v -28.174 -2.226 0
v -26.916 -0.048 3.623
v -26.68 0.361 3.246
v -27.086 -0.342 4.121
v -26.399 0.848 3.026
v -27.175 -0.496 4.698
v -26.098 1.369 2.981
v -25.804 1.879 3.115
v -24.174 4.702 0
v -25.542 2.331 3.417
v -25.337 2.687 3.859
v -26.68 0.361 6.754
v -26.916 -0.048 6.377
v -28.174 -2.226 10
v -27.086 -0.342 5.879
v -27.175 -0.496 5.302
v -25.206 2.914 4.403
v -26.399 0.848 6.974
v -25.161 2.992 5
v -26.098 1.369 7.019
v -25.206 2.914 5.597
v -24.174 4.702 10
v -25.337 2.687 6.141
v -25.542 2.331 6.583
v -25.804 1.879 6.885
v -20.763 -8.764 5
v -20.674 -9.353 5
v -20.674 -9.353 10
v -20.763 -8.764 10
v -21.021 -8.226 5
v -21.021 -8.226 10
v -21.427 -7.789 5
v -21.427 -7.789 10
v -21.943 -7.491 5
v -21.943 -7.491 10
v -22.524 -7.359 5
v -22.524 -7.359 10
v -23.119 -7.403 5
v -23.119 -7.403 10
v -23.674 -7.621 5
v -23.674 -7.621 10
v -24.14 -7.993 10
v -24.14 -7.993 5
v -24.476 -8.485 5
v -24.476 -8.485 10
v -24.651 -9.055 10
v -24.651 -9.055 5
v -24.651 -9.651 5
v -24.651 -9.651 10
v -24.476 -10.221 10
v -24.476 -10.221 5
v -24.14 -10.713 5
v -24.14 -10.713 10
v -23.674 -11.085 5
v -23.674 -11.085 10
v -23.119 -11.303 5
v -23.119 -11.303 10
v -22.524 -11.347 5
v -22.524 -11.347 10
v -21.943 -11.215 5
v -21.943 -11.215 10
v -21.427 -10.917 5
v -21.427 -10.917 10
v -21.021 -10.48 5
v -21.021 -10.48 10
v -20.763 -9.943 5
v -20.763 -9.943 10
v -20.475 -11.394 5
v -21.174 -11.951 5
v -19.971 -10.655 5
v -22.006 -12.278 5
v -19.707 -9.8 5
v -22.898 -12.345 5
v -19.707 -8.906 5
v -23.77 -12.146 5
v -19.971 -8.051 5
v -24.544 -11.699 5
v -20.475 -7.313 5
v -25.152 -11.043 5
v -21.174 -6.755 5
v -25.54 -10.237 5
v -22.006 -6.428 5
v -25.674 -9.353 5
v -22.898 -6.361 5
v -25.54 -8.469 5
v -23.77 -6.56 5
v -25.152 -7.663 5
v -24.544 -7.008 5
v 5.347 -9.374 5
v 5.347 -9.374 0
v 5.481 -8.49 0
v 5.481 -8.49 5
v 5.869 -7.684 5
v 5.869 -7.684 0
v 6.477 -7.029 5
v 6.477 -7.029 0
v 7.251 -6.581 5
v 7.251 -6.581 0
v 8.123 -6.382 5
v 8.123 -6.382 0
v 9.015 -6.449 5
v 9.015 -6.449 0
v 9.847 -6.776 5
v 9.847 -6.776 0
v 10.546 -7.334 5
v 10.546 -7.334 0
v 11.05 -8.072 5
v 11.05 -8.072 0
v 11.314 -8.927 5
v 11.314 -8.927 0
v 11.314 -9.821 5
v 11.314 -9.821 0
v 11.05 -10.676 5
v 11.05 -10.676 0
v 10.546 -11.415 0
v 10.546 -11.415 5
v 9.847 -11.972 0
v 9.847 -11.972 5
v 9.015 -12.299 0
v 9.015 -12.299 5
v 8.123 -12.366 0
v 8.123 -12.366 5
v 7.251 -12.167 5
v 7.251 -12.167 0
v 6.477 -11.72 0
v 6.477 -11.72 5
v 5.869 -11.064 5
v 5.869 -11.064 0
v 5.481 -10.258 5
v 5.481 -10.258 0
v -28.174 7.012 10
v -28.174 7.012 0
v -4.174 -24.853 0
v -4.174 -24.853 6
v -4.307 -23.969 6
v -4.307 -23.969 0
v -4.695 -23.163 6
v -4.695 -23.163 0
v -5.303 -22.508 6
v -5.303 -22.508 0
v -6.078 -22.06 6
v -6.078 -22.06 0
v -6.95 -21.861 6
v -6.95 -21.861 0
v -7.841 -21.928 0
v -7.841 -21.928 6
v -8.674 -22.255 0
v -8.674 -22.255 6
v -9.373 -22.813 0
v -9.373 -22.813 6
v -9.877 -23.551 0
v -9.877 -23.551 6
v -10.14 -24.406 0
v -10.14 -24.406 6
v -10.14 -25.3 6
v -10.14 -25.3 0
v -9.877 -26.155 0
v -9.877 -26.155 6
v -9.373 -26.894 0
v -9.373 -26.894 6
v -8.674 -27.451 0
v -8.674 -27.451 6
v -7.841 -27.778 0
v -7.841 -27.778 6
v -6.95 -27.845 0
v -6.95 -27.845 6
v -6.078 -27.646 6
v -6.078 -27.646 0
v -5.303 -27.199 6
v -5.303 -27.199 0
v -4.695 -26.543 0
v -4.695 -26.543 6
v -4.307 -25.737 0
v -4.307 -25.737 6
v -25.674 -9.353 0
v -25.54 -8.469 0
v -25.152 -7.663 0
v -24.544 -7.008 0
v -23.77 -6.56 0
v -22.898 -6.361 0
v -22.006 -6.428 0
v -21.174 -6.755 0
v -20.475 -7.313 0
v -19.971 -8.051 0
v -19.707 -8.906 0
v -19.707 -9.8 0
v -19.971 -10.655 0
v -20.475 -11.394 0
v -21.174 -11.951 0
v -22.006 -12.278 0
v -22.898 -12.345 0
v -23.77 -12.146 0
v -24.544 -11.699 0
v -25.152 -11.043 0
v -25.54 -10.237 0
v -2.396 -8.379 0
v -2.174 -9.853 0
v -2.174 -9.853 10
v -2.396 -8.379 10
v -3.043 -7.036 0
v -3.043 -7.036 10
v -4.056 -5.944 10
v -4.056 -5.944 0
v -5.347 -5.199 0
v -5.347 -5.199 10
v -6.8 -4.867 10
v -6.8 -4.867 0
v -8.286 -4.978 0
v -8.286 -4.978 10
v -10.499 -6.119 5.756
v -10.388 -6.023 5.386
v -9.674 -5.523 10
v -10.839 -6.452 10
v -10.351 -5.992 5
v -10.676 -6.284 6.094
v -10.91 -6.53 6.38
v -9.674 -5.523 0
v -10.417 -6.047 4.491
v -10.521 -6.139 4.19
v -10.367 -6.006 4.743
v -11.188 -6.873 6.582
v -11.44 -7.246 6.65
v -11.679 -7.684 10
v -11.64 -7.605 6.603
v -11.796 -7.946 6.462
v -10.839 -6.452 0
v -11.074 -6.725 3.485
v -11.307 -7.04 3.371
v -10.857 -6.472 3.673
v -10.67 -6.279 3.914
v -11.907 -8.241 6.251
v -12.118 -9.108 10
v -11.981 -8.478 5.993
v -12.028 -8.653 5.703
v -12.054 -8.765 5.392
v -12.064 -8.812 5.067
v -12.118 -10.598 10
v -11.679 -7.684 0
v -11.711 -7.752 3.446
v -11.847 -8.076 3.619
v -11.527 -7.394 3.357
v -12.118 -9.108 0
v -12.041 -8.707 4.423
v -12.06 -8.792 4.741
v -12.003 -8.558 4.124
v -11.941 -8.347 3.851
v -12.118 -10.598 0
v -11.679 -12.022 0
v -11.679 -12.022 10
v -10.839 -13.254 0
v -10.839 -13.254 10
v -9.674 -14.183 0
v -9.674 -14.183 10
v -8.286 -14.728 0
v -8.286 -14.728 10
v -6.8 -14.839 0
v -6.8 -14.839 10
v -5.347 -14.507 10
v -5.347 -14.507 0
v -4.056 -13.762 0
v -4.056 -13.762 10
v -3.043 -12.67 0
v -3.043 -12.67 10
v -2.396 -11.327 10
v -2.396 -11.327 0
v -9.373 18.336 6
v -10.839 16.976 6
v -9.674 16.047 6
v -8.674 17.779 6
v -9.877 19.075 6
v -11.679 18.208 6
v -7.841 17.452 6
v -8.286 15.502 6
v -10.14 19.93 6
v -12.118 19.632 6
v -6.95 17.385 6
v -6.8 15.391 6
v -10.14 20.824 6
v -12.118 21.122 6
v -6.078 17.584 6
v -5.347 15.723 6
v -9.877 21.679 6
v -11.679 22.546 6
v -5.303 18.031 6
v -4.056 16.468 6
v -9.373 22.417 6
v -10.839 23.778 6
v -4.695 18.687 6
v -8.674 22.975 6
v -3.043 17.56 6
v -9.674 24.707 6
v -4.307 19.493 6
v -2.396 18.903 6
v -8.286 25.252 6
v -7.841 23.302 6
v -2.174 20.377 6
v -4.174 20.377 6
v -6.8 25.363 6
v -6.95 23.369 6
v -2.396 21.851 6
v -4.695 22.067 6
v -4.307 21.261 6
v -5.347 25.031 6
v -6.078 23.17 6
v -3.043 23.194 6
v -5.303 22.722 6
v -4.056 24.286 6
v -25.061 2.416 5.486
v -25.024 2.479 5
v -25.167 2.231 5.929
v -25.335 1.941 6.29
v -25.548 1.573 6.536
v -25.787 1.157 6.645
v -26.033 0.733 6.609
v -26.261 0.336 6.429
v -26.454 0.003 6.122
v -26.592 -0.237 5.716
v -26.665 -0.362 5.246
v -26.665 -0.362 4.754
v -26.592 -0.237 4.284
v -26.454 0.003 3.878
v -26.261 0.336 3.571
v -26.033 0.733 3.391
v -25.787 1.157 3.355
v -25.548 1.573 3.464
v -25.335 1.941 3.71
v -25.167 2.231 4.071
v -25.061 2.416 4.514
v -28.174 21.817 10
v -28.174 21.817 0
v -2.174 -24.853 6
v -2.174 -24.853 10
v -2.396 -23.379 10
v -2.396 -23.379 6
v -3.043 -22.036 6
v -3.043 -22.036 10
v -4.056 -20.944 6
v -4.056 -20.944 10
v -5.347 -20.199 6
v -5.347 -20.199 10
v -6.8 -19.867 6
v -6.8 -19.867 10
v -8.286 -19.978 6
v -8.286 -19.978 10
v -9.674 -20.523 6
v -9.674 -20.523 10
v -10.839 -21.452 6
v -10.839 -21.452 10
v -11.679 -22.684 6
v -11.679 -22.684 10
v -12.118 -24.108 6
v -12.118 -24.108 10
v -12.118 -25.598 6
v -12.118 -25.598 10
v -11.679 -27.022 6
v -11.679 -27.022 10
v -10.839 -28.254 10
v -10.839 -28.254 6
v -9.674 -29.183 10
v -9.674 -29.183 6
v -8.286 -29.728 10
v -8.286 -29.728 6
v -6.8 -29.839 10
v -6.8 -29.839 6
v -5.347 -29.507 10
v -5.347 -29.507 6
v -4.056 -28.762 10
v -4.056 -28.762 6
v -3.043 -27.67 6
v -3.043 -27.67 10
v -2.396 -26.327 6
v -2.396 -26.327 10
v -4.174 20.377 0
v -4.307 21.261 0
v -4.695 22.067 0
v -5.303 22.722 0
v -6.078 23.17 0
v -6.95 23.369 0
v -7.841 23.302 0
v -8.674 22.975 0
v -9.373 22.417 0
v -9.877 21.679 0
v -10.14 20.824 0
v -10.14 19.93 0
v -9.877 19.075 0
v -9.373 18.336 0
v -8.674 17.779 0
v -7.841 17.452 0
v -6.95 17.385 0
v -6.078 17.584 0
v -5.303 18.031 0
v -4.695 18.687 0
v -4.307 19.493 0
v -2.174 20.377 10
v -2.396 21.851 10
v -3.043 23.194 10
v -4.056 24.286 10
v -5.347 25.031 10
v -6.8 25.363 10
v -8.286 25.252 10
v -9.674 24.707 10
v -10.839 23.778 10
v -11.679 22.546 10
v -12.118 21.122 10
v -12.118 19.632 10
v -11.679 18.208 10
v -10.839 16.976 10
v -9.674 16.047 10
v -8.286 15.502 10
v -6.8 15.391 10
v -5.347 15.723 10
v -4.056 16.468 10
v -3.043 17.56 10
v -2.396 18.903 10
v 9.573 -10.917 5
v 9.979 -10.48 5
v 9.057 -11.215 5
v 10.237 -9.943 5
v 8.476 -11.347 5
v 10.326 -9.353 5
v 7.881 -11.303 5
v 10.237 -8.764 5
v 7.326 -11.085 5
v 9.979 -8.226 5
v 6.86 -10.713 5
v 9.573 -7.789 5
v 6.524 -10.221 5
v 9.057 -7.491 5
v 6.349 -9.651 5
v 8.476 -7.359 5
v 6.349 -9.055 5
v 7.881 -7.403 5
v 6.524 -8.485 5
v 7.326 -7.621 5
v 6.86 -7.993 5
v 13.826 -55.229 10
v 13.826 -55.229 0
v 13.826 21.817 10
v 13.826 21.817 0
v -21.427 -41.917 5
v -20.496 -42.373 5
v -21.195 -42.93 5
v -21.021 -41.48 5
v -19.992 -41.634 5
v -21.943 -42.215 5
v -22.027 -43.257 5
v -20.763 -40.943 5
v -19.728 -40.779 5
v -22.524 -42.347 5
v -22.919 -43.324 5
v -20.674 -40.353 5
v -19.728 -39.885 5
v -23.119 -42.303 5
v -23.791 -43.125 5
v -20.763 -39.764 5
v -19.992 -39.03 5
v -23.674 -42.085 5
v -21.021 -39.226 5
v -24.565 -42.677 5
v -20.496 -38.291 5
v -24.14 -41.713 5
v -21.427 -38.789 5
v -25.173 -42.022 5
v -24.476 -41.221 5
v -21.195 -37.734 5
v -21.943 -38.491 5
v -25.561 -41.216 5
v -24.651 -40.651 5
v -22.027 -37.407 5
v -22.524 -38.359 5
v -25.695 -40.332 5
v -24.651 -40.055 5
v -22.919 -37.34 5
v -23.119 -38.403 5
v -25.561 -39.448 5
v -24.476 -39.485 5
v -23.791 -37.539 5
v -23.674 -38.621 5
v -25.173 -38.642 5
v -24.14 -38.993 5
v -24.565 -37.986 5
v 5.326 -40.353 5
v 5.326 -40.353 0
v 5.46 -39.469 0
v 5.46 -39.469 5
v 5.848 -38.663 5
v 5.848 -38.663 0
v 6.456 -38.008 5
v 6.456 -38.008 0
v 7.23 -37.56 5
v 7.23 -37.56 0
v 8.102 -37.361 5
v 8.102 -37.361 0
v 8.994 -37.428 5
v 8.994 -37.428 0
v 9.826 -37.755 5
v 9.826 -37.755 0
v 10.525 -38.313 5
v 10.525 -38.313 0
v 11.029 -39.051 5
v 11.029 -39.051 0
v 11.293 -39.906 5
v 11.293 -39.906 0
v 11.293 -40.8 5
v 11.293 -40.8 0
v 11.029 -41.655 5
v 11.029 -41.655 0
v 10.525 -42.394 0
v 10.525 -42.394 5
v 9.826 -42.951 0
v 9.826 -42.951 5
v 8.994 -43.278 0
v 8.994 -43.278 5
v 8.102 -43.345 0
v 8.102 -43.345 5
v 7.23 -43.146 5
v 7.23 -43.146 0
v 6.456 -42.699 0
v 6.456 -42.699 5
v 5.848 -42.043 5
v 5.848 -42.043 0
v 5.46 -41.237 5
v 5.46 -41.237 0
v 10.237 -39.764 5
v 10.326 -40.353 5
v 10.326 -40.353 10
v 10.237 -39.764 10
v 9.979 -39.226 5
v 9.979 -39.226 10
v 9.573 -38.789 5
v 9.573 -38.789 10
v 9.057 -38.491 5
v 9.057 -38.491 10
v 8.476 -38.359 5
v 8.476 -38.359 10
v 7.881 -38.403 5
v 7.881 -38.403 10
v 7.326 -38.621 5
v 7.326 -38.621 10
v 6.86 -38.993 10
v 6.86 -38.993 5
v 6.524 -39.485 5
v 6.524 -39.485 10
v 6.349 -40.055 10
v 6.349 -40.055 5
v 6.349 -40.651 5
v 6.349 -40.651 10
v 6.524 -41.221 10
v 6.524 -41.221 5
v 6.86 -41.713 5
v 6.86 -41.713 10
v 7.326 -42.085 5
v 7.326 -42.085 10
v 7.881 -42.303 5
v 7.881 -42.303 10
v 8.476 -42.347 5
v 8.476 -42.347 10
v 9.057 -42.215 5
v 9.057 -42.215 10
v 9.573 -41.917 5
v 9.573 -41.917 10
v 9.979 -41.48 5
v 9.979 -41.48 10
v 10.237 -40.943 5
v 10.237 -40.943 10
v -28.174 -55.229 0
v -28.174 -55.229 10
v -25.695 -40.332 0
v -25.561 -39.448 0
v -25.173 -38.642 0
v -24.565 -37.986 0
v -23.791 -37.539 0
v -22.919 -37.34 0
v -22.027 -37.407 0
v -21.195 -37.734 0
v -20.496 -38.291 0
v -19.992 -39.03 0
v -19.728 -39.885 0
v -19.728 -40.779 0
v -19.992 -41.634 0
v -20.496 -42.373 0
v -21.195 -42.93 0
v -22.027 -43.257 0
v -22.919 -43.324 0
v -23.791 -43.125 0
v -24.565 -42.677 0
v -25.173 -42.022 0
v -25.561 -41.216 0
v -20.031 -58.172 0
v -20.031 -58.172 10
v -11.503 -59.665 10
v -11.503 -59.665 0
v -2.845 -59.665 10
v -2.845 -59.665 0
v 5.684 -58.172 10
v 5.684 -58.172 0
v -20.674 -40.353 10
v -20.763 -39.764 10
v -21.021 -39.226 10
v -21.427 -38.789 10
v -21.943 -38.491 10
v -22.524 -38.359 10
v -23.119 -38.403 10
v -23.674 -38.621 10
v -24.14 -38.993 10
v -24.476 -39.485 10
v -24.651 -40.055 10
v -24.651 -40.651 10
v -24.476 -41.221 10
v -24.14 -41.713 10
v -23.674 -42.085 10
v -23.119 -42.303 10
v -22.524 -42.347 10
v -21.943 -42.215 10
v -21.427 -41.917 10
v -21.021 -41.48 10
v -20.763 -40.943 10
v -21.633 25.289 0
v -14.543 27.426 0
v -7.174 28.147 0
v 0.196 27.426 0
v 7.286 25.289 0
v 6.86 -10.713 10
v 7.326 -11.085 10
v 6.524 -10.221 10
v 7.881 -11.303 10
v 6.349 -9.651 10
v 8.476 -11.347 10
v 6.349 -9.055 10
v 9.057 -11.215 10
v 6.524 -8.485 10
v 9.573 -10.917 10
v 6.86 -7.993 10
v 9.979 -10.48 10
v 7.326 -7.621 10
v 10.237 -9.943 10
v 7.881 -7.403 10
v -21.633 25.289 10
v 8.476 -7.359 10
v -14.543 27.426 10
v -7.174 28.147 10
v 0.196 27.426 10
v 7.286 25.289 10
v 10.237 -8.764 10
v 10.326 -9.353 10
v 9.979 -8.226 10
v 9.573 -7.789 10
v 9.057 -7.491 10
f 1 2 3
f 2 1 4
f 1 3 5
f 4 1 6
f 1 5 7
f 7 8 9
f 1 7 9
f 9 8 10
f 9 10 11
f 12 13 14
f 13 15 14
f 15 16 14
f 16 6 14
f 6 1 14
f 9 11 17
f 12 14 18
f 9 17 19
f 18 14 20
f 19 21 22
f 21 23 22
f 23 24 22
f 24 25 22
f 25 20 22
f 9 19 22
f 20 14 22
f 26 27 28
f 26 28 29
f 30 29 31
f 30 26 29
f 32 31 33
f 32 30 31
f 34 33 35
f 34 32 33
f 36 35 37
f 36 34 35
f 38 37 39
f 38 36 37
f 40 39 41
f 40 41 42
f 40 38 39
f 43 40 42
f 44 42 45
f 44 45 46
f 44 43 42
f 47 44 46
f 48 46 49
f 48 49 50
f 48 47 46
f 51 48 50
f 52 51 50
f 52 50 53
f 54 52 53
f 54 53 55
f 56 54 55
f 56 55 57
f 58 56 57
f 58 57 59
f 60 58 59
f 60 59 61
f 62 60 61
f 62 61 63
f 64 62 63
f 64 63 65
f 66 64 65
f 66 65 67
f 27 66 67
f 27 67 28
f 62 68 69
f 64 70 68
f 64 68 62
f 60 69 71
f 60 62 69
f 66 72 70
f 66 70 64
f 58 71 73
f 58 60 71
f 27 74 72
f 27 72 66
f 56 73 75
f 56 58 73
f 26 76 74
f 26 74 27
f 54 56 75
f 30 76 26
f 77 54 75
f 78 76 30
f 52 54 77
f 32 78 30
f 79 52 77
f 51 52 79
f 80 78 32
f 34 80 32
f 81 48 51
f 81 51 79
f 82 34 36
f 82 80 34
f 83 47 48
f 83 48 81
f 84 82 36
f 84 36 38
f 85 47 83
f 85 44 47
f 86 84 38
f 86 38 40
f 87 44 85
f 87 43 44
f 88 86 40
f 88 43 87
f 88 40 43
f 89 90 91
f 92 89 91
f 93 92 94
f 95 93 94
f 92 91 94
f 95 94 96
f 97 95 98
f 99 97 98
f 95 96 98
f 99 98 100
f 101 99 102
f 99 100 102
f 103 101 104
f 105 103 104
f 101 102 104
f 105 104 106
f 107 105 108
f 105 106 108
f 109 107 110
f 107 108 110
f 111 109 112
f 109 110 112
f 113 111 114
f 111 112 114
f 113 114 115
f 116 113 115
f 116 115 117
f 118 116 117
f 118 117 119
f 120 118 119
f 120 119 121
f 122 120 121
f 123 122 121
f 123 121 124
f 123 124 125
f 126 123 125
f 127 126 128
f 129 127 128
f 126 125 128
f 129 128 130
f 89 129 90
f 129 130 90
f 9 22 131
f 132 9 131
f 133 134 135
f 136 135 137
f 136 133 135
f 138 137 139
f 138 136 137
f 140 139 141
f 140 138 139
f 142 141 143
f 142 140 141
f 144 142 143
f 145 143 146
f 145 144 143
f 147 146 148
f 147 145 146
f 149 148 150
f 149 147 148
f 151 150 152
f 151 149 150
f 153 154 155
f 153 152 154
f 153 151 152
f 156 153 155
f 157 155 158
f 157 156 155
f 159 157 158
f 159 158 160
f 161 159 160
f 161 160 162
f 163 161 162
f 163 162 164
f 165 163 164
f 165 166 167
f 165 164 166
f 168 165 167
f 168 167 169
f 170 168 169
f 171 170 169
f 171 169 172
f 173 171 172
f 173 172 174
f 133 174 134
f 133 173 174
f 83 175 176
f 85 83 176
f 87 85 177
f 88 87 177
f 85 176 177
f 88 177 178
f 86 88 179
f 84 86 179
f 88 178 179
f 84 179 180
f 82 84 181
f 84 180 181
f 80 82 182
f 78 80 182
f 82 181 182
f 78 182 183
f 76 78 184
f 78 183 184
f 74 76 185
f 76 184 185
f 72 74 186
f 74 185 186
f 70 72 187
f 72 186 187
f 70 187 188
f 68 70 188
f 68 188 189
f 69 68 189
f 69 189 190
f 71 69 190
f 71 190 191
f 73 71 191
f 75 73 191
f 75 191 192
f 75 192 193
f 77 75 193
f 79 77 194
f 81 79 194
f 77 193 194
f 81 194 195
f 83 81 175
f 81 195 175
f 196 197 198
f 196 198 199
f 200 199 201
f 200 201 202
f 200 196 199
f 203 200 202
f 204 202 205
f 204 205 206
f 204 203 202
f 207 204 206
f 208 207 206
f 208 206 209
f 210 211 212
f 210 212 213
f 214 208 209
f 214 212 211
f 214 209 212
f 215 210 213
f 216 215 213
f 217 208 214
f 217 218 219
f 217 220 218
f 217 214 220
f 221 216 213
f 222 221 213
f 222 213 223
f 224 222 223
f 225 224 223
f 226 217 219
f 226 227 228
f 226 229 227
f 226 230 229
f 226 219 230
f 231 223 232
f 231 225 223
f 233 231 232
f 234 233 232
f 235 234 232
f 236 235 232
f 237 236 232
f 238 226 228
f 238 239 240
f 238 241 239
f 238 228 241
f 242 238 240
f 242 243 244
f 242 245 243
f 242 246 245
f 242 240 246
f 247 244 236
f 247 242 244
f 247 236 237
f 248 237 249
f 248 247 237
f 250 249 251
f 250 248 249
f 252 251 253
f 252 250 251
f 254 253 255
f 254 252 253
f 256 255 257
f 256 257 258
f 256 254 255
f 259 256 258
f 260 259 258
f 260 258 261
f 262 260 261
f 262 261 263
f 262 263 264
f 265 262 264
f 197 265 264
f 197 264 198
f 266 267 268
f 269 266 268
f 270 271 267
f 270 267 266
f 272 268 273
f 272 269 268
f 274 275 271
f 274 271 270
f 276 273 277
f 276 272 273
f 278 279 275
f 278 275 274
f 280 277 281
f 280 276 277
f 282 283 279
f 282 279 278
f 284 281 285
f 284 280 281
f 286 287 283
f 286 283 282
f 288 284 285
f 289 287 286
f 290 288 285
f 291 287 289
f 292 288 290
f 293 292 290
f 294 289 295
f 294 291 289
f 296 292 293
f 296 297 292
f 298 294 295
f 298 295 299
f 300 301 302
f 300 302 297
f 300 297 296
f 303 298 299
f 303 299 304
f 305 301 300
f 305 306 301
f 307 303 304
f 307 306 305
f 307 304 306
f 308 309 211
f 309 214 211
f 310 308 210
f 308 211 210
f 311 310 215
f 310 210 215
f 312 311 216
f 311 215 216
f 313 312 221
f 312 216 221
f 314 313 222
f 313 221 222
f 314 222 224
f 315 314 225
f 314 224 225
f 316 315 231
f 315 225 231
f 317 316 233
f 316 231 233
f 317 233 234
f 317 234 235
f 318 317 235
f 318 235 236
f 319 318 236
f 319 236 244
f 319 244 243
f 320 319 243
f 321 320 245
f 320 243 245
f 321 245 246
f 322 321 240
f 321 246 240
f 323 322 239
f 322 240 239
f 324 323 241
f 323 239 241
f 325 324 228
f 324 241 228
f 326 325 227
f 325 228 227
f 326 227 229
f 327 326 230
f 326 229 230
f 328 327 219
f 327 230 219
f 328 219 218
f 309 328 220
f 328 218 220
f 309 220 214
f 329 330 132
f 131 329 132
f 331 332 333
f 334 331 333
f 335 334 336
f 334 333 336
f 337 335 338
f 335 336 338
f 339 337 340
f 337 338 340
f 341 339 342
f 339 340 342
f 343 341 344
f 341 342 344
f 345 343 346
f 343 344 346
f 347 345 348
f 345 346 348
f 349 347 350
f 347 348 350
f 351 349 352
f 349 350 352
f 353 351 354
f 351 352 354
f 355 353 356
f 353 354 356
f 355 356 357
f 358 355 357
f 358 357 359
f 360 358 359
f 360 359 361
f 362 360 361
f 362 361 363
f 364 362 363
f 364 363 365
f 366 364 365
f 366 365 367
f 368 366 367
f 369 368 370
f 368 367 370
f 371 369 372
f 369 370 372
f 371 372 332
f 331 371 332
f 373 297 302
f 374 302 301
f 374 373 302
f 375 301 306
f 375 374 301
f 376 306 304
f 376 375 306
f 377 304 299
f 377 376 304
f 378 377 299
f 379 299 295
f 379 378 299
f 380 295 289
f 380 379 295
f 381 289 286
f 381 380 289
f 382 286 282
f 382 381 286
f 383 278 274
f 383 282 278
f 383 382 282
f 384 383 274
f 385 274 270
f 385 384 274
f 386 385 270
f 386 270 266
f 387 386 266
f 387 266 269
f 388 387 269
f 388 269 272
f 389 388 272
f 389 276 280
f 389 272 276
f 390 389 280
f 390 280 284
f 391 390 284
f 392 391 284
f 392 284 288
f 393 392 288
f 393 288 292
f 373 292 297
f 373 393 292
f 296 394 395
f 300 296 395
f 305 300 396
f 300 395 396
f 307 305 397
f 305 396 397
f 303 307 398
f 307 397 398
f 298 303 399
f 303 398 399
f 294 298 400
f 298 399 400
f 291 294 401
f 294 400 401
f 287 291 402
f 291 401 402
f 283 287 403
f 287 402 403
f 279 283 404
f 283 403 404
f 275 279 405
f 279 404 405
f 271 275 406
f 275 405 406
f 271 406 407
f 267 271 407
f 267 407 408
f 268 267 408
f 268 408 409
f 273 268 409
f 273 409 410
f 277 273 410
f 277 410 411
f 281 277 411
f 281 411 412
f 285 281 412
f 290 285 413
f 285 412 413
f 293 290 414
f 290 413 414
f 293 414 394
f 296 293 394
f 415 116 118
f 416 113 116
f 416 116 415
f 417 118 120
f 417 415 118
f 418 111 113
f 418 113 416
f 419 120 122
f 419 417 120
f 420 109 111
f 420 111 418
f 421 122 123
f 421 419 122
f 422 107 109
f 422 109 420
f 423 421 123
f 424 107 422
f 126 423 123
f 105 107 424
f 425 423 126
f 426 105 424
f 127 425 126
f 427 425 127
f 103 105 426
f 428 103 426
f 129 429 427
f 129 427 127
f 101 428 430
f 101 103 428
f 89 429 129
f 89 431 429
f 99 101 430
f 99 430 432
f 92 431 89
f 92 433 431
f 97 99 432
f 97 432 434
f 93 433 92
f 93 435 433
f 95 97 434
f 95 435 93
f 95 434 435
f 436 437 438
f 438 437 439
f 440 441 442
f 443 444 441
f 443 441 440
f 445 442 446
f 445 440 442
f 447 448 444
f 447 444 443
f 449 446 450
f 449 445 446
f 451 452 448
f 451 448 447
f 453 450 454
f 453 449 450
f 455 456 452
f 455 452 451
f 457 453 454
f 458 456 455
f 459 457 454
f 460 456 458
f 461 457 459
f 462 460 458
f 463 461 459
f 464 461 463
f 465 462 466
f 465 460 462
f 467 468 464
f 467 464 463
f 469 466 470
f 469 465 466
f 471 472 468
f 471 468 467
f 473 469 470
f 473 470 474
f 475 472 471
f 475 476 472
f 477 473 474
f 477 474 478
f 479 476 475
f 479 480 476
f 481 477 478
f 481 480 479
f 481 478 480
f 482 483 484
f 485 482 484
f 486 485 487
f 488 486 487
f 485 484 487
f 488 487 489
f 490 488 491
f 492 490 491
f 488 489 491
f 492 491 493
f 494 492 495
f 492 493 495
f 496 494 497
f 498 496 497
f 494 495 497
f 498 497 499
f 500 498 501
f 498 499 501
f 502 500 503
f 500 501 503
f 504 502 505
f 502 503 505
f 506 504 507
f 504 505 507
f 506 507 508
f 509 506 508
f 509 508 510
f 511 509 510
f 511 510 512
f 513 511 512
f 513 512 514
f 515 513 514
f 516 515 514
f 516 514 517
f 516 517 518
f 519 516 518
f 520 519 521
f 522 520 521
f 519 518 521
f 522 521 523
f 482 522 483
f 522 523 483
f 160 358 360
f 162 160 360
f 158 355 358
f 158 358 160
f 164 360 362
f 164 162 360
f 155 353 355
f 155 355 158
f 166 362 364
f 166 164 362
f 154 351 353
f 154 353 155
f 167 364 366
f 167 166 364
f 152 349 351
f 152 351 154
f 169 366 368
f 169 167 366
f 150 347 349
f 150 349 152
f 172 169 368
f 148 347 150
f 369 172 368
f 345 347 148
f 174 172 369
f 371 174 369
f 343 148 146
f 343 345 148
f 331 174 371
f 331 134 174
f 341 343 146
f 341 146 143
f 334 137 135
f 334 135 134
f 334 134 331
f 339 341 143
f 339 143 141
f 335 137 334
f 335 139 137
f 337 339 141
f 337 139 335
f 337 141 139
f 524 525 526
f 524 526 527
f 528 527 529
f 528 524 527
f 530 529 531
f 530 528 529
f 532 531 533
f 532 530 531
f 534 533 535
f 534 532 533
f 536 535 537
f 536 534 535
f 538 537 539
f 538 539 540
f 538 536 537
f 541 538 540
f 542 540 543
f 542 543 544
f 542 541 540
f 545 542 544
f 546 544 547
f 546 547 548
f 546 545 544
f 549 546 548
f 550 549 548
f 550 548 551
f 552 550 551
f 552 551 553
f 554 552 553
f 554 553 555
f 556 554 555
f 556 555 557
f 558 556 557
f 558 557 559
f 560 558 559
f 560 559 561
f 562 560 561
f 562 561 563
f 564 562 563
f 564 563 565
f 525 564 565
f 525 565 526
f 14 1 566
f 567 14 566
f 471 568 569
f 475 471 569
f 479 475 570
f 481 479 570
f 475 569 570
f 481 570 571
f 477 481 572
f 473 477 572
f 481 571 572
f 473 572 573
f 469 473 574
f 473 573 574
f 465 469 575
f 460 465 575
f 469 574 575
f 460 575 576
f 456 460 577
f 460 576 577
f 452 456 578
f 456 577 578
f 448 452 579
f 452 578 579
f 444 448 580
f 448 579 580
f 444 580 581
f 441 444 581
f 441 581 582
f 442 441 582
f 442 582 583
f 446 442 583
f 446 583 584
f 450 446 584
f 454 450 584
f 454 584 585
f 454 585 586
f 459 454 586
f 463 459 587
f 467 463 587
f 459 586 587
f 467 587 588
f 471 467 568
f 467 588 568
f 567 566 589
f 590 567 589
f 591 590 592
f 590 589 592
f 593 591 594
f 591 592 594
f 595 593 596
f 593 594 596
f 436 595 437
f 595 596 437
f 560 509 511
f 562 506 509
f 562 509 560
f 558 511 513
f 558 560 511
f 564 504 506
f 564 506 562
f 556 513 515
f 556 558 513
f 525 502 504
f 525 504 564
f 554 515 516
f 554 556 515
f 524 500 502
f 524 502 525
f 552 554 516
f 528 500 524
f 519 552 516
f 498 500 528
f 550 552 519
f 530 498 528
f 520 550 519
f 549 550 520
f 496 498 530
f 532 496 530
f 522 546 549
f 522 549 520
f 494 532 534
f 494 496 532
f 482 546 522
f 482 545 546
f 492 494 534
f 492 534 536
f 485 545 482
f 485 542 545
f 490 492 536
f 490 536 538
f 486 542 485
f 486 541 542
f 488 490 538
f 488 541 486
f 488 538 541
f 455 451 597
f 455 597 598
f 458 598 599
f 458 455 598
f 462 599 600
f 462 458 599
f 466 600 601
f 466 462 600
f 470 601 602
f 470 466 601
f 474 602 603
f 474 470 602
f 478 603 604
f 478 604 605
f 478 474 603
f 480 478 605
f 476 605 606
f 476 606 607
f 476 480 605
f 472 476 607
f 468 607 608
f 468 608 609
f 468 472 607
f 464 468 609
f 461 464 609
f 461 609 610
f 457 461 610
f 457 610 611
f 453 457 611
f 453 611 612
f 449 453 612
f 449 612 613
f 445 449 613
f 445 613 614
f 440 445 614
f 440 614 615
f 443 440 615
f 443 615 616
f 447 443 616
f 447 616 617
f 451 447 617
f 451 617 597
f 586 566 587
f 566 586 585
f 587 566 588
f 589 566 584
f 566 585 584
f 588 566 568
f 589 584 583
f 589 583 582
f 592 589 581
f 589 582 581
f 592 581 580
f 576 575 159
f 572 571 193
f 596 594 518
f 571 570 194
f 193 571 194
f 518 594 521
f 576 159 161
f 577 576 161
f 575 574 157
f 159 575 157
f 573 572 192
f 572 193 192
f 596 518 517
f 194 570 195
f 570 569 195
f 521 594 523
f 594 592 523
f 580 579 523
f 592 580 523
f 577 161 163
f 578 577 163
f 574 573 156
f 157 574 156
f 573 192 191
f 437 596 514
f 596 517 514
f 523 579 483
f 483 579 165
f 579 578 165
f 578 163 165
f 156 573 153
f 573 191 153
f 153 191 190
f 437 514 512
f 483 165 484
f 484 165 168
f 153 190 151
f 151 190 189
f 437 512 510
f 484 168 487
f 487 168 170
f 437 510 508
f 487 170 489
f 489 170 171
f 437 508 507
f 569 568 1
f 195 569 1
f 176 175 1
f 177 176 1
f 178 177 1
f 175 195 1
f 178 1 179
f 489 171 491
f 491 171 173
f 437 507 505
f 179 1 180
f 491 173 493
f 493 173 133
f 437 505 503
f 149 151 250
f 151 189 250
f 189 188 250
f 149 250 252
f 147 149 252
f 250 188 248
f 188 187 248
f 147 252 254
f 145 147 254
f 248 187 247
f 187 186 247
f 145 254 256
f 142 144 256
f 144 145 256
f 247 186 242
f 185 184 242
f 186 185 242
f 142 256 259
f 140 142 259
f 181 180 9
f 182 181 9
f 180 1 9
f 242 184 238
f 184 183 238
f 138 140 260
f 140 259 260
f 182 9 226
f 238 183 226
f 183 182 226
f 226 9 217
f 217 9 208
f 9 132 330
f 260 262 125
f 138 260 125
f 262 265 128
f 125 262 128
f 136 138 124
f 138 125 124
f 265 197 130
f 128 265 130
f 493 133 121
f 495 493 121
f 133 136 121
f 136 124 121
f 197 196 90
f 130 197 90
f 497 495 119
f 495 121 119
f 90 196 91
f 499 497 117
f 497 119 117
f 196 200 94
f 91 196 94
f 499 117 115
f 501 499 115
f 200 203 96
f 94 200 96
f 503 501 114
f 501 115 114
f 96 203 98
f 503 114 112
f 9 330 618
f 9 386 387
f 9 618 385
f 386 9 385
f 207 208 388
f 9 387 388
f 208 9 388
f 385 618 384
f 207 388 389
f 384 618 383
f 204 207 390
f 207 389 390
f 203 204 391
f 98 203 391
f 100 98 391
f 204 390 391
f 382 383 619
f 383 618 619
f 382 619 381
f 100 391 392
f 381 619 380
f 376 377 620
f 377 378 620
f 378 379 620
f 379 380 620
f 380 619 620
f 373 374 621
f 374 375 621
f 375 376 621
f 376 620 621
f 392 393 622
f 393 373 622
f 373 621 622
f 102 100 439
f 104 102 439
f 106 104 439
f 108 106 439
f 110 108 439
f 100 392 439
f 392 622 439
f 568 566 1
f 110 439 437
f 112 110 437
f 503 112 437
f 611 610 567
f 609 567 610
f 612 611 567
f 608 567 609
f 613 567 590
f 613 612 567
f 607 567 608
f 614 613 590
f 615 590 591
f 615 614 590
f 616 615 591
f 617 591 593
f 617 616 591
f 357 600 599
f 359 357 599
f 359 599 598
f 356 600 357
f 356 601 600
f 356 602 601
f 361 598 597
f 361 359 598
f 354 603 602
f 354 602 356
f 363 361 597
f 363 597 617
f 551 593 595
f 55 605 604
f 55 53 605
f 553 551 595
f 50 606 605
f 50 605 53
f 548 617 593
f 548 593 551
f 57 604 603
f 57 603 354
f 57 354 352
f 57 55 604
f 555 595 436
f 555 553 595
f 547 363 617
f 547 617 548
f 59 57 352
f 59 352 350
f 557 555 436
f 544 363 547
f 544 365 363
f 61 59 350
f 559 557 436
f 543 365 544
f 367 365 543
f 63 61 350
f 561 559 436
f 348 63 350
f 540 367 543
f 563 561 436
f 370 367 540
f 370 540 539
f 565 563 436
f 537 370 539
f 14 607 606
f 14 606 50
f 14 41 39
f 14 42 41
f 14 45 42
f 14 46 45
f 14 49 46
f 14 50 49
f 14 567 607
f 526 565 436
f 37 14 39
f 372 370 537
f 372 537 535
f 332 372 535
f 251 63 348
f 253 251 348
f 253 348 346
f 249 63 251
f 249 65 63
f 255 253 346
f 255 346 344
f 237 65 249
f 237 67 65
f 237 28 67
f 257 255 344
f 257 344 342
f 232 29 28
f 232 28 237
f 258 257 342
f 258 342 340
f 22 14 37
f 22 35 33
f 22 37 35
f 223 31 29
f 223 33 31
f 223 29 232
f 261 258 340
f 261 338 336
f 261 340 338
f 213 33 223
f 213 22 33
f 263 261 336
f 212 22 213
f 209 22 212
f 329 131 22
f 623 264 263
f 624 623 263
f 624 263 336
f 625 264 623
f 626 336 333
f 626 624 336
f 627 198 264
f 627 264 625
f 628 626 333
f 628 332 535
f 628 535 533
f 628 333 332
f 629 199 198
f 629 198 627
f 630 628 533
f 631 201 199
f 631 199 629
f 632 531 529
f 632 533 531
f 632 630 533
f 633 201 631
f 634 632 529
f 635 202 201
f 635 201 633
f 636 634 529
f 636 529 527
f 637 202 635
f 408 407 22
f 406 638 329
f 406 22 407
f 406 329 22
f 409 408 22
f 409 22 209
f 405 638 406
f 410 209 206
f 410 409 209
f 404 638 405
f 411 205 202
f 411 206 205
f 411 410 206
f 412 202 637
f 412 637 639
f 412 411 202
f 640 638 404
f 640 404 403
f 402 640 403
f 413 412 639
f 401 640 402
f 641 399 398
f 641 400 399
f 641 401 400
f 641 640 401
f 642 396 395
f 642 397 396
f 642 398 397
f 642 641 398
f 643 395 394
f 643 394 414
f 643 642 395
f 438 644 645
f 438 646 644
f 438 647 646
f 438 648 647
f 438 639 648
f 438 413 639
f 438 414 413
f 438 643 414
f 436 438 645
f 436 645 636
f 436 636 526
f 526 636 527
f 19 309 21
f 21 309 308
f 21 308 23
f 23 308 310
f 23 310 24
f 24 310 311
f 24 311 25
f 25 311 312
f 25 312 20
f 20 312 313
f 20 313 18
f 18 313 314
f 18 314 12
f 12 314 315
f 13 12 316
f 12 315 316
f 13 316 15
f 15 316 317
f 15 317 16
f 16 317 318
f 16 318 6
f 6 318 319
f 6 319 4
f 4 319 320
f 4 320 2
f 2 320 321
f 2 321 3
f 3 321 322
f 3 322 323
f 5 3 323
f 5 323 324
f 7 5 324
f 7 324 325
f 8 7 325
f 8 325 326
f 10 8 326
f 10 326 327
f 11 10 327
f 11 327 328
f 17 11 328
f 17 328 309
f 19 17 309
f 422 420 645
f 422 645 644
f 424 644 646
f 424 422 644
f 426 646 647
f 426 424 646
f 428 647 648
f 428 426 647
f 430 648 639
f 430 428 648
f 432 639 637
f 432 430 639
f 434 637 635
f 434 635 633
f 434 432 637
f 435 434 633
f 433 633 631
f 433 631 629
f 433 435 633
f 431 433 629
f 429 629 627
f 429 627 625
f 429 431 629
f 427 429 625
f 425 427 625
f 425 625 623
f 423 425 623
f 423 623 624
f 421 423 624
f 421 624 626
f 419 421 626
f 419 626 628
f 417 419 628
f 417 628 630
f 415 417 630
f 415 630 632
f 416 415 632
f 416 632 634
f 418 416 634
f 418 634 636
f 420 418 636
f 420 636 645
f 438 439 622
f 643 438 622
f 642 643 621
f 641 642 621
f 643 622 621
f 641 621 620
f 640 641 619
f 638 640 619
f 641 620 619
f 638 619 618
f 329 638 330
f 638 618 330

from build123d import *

# Parameters (mm, degrees)
SKIZZE1_R                       = 3
SKIZZE1_R_2                     = 5
SKIZZE1_R_3                     = 2
AUFSATZ_LINEAR_AUSTRAGEN1_DEPTH = 10
SKIZZE2_R                       = 5
SCHNITT_LINEAR_AUSTRAGEN1_DEPTH = 4
SKIZZE3_R                       = 3
SCHNITT_LINEAR_AUSTRAGEN2_DEPTH = 5
SCHNITT_LINEAR_AUSTRAGEN3_DEPTH = 10
SKIZZE6_R                       = 1.5
SCHNITT_LINEAR_AUSTRAGEN4_DEPTH = 20
M4_GEWINDEBOHRUNG3_D            = 3.3
M4_GEWINDEBOHRUNG3_DEPTH        = 20
M4_GEWINDEBOHRUNG3_CSINK_D      = 4.05
M4_GEWINDEBOHRUNG3_CSINK_ANGLE  = 90
M4_GEWINDEBOHRUNG3_TIP          = 0.991420021


with BuildPart() as part:
    # Skizze1 → Aufsatz-Linear austragen1 (new body)
    with BuildSketch(Plane.XY):
        with BuildLine():
            Line((-28.173757618, -45.853019157), (-28.173757618, -55.229224375))
            ThreePointArc((-28.173757618, -55.229224375), (-7.173757618, -59.853019157), (13.826242382, -55.229224375))
            Line((13.826242382, -55.229224375), (13.826242382, -45.853019157))
            Line((13.826242382, -45.853019157), (13.826242382, 21.817156087))
            ThreePointArc((13.826242382, 21.817156087), (-7.173757618, 28.146980843), (-28.173757618, 21.817156087))
            Line((-28.173757618, 21.817156087), (-28.173757618, -45.853019157))
        make_face()
        with Locations((-7.173757618, -24.853019157)):
            Circle(SKIZZE1_R, mode=Mode.SUBTRACT)
        with Locations((-7.173757618, -9.853019157)):
            Circle(SKIZZE1_R_2, mode=Mode.SUBTRACT)
        with Locations((-22.673757618, -9.353019157)):
            Circle(SKIZZE1_R_3, mode=Mode.SUBTRACT)
        with Locations((-22.673757618, -40.353019157)):
            Circle(SKIZZE1_R_3, mode=Mode.SUBTRACT)
        with Locations((8.326242382, -40.353019157)):
            Circle(SKIZZE1_R_3, mode=Mode.SUBTRACT)
        with Locations((8.326242382, -9.353019157)):
            Circle(SKIZZE1_R_3, mode=Mode.SUBTRACT)
        with Locations((-7.173757618, 20.376980843)):
            Circle(SKIZZE1_R, mode=Mode.SUBTRACT)
    extrude(amount=AUFSATZ_LINEAR_AUSTRAGEN1_DEPTH)

    # Skizze2 → Schnitt-Linear austragen1 (cut)
    with BuildSketch(Plane.XY.offset(10)):
        with Locations((-7.173757618, -24.853019157)):
            Circle(SKIZZE2_R)
        with Locations((-7.173757618, 20.376980843)):
            Circle(SKIZZE2_R)
    extrude(amount=-SCHNITT_LINEAR_AUSTRAGEN1_DEPTH, mode=Mode.SUBTRACT)

    # Skizze3 → Schnitt-Linear austragen2 (cut)
    with BuildSketch(Plane(origin=(0, 0, 0), x_dir=(-1, 0, 0), z_dir=(0, 0, -1))):
        with Locations((22.694764405, -40.331983862)):
            Circle(SKIZZE3_R)
        with Locations((-8.326242382, -40.353019157)):
            Circle(SKIZZE3_R)
        with Locations((22.673757618, -9.353019157)):
            Circle(SKIZZE3_R)
        with Locations((-8.347249168, -9.374054453)):
            Circle(SKIZZE3_R)
    extrude(amount=-SCHNITT_LINEAR_AUSTRAGEN2_DEPTH, mode=Mode.SUBTRACT)

    # Skizze5 → Schnitt-Linear austragen3 (cut)
    with BuildSketch(Plane.XY.offset(10)):
        Polygon((-28.173757618, -2.226086116), (-24.173757618, 4.702117114), (-28.173757618, 7.011518191), align=None)
    extrude(amount=-SCHNITT_LINEAR_AUSTRAGEN3_DEPTH, mode=Mode.SUBTRACT)

    # Skizze6 → Schnitt-Linear austragen4 (cut)
    with BuildSketch(Plane(origin=(-20.16639465, 11.64307338, 0), x_dir=(0, 0, 1), z_dir=(-0.8660254037844384, 0.5000000000000007, 0))):
        with Locations(Location((5, -12.014725937, 0), (0, 0, 270))):
            Circle(SKIZZE6_R)
    extrude(amount=-SCHNITT_LINEAR_AUSTRAGEN4_DEPTH, mode=Mode.SUBTRACT)

    # M4 Gewindebohrung3
    with Locations(Plane(origin=(-26.173757618, 1.238015499, 5), x_dir=(-0.5, -0.866025403784, 0), z_dir=(-0.866025403784, 0.5, 0))):
        with Locations((0, 0)):
            CounterSinkHole(M4_GEWINDEBOHRUNG3_D / 2, M4_GEWINDEBOHRUNG3_CSINK_D / 2, depth=M4_GEWINDEBOHRUNG3_DEPTH, counter_sink_angle=M4_GEWINDEBOHRUNG3_CSINK_ANGLE)
            with Locations((0, 0, -(M4_GEWINDEBOHRUNG3_DEPTH + M4_GEWINDEBOHRUNG3_TIP / 2))):  # 118° drill point
                Cone(0, M4_GEWINDEBOHRUNG3_D / 2, M4_GEWINDEBOHRUNG3_TIP, mode=Mode.SUBTRACT)


solid = part.part
